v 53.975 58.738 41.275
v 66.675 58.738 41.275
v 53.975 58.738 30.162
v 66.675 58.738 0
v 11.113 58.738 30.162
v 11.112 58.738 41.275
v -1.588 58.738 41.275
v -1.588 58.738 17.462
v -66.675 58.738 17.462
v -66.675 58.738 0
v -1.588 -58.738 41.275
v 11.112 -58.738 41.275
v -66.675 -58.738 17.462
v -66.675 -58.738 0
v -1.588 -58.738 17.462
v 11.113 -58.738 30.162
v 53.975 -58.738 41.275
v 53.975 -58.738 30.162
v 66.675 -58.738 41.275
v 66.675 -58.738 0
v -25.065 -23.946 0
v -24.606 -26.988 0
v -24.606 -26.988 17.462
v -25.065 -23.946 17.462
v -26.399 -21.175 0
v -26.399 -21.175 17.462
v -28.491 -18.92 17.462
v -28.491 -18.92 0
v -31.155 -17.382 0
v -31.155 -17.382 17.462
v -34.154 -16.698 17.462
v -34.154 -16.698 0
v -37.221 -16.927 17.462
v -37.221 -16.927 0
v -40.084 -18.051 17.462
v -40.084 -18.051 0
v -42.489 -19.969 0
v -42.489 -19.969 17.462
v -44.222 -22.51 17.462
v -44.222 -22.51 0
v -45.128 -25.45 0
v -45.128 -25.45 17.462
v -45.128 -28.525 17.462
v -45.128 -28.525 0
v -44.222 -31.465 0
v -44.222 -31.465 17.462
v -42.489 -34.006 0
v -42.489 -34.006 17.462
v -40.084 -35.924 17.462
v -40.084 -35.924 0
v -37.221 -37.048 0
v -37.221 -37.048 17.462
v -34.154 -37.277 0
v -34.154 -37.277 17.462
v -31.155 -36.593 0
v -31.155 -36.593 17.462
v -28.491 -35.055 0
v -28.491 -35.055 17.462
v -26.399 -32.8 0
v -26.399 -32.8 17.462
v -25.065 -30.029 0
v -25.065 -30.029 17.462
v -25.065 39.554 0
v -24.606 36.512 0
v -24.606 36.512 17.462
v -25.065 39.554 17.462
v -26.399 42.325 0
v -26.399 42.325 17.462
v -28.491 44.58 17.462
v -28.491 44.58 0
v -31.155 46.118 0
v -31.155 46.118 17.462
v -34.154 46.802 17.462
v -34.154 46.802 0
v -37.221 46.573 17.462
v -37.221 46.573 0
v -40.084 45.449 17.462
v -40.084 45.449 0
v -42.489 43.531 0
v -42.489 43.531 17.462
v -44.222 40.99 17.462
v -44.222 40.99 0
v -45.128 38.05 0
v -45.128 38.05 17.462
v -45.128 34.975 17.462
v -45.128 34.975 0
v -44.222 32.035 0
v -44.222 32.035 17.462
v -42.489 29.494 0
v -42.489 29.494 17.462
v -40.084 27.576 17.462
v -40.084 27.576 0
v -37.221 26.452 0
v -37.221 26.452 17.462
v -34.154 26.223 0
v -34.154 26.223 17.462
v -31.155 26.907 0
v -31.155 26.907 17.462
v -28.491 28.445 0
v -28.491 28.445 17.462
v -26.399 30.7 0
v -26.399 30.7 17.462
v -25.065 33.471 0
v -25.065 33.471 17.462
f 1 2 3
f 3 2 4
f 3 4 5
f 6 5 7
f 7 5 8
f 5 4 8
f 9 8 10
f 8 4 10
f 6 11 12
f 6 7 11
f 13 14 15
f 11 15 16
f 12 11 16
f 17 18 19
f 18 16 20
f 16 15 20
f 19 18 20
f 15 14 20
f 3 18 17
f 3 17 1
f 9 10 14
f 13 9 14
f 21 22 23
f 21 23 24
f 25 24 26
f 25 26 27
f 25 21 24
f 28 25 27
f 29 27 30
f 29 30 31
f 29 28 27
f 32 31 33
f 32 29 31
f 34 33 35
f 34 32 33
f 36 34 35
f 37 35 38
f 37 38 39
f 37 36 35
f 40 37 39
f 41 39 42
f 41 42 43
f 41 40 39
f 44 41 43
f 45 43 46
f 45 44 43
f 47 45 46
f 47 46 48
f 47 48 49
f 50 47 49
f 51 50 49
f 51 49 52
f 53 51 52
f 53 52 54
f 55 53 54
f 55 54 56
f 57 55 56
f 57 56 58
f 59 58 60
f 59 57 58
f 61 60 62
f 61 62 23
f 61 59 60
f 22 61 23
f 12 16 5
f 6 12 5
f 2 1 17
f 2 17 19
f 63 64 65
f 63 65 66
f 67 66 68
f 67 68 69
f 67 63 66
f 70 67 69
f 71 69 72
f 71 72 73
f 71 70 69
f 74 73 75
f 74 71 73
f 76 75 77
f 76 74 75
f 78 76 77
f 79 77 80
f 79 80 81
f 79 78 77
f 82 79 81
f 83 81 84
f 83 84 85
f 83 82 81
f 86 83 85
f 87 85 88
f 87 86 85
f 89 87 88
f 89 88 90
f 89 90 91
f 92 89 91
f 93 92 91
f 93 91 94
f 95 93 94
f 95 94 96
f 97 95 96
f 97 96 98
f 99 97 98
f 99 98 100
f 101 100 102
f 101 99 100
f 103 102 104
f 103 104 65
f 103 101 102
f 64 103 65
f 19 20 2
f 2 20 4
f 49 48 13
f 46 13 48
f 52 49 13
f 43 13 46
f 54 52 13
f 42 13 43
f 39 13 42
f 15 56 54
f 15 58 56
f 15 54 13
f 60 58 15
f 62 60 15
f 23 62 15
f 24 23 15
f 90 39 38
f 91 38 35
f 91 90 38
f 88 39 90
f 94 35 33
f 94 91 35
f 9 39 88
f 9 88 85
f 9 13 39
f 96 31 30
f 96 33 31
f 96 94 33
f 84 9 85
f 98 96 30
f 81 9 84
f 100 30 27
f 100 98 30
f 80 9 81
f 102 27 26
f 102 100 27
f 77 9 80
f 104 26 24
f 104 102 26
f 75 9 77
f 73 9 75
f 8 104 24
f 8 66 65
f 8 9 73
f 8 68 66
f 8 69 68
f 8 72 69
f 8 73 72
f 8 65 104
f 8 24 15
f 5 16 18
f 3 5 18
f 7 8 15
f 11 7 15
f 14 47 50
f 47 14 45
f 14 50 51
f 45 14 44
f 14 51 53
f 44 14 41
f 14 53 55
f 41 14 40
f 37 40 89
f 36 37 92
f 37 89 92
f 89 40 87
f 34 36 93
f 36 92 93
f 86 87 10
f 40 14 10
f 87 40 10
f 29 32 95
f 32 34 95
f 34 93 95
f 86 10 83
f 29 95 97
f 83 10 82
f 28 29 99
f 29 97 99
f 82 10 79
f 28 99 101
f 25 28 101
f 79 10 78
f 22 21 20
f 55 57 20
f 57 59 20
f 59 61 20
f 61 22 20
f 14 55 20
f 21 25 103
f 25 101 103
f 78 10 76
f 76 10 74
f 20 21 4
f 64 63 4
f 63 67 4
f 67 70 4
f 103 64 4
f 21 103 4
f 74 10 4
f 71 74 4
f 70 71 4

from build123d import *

# Parameters (mm, degrees)
F1_DEPTH = 41.275
F0_W     = 42.8625
F0_H     = 117.475
F2_DEPTH = 30.1625
F0_W_2   = 12.7
F3_DEPTH = 41.275
F0_R     = 10.31875
F4_DEPTH = 17.4625


with BuildPart() as f1:
    # F0 (on Top) → F1 (new body)
    with BuildSketch(Plane.XY):
        Polygon((-1.5875, -58.7375), (11.1125, -58.7375), (11.1125, 58.7375), (-1.5875, 58.7375), (-1.5875, 4.7625), align=None)
    extrude(amount=F1_DEPTH)

    # F0 (on Top) → F2 (join)
    with BuildSketch(Plane.XY):
        with Locations((32.54375, 0)):
            Rectangle(F0_W, F0_H)
    extrude(amount=F2_DEPTH)

    # F0 (on Top) → F3 (join)
    with BuildSketch(Plane.XY):
        with Locations((60.325, 0)):
            Rectangle(F0_W_2, F0_H)
    extrude(amount=F3_DEPTH)

    # F0 (on Top) → F4 (join)
    with BuildSketch(Plane.XY):
        Polygon((-66.675, -58.7375), (-1.5875, -58.7375), (-1.5875, 4.7625), (-1.5875, 58.7375), (-66.675, 58.7375), align=None)
        with Locations((-34.925, -26.9875)):
            Circle(F0_R, mode=Mode.SUBTRACT)
        with Locations((-34.925, 36.5125)):
            Circle(F0_R, mode=Mode.SUBTRACT)
    extrude(amount=F4_DEPTH)


solid = f1.part
